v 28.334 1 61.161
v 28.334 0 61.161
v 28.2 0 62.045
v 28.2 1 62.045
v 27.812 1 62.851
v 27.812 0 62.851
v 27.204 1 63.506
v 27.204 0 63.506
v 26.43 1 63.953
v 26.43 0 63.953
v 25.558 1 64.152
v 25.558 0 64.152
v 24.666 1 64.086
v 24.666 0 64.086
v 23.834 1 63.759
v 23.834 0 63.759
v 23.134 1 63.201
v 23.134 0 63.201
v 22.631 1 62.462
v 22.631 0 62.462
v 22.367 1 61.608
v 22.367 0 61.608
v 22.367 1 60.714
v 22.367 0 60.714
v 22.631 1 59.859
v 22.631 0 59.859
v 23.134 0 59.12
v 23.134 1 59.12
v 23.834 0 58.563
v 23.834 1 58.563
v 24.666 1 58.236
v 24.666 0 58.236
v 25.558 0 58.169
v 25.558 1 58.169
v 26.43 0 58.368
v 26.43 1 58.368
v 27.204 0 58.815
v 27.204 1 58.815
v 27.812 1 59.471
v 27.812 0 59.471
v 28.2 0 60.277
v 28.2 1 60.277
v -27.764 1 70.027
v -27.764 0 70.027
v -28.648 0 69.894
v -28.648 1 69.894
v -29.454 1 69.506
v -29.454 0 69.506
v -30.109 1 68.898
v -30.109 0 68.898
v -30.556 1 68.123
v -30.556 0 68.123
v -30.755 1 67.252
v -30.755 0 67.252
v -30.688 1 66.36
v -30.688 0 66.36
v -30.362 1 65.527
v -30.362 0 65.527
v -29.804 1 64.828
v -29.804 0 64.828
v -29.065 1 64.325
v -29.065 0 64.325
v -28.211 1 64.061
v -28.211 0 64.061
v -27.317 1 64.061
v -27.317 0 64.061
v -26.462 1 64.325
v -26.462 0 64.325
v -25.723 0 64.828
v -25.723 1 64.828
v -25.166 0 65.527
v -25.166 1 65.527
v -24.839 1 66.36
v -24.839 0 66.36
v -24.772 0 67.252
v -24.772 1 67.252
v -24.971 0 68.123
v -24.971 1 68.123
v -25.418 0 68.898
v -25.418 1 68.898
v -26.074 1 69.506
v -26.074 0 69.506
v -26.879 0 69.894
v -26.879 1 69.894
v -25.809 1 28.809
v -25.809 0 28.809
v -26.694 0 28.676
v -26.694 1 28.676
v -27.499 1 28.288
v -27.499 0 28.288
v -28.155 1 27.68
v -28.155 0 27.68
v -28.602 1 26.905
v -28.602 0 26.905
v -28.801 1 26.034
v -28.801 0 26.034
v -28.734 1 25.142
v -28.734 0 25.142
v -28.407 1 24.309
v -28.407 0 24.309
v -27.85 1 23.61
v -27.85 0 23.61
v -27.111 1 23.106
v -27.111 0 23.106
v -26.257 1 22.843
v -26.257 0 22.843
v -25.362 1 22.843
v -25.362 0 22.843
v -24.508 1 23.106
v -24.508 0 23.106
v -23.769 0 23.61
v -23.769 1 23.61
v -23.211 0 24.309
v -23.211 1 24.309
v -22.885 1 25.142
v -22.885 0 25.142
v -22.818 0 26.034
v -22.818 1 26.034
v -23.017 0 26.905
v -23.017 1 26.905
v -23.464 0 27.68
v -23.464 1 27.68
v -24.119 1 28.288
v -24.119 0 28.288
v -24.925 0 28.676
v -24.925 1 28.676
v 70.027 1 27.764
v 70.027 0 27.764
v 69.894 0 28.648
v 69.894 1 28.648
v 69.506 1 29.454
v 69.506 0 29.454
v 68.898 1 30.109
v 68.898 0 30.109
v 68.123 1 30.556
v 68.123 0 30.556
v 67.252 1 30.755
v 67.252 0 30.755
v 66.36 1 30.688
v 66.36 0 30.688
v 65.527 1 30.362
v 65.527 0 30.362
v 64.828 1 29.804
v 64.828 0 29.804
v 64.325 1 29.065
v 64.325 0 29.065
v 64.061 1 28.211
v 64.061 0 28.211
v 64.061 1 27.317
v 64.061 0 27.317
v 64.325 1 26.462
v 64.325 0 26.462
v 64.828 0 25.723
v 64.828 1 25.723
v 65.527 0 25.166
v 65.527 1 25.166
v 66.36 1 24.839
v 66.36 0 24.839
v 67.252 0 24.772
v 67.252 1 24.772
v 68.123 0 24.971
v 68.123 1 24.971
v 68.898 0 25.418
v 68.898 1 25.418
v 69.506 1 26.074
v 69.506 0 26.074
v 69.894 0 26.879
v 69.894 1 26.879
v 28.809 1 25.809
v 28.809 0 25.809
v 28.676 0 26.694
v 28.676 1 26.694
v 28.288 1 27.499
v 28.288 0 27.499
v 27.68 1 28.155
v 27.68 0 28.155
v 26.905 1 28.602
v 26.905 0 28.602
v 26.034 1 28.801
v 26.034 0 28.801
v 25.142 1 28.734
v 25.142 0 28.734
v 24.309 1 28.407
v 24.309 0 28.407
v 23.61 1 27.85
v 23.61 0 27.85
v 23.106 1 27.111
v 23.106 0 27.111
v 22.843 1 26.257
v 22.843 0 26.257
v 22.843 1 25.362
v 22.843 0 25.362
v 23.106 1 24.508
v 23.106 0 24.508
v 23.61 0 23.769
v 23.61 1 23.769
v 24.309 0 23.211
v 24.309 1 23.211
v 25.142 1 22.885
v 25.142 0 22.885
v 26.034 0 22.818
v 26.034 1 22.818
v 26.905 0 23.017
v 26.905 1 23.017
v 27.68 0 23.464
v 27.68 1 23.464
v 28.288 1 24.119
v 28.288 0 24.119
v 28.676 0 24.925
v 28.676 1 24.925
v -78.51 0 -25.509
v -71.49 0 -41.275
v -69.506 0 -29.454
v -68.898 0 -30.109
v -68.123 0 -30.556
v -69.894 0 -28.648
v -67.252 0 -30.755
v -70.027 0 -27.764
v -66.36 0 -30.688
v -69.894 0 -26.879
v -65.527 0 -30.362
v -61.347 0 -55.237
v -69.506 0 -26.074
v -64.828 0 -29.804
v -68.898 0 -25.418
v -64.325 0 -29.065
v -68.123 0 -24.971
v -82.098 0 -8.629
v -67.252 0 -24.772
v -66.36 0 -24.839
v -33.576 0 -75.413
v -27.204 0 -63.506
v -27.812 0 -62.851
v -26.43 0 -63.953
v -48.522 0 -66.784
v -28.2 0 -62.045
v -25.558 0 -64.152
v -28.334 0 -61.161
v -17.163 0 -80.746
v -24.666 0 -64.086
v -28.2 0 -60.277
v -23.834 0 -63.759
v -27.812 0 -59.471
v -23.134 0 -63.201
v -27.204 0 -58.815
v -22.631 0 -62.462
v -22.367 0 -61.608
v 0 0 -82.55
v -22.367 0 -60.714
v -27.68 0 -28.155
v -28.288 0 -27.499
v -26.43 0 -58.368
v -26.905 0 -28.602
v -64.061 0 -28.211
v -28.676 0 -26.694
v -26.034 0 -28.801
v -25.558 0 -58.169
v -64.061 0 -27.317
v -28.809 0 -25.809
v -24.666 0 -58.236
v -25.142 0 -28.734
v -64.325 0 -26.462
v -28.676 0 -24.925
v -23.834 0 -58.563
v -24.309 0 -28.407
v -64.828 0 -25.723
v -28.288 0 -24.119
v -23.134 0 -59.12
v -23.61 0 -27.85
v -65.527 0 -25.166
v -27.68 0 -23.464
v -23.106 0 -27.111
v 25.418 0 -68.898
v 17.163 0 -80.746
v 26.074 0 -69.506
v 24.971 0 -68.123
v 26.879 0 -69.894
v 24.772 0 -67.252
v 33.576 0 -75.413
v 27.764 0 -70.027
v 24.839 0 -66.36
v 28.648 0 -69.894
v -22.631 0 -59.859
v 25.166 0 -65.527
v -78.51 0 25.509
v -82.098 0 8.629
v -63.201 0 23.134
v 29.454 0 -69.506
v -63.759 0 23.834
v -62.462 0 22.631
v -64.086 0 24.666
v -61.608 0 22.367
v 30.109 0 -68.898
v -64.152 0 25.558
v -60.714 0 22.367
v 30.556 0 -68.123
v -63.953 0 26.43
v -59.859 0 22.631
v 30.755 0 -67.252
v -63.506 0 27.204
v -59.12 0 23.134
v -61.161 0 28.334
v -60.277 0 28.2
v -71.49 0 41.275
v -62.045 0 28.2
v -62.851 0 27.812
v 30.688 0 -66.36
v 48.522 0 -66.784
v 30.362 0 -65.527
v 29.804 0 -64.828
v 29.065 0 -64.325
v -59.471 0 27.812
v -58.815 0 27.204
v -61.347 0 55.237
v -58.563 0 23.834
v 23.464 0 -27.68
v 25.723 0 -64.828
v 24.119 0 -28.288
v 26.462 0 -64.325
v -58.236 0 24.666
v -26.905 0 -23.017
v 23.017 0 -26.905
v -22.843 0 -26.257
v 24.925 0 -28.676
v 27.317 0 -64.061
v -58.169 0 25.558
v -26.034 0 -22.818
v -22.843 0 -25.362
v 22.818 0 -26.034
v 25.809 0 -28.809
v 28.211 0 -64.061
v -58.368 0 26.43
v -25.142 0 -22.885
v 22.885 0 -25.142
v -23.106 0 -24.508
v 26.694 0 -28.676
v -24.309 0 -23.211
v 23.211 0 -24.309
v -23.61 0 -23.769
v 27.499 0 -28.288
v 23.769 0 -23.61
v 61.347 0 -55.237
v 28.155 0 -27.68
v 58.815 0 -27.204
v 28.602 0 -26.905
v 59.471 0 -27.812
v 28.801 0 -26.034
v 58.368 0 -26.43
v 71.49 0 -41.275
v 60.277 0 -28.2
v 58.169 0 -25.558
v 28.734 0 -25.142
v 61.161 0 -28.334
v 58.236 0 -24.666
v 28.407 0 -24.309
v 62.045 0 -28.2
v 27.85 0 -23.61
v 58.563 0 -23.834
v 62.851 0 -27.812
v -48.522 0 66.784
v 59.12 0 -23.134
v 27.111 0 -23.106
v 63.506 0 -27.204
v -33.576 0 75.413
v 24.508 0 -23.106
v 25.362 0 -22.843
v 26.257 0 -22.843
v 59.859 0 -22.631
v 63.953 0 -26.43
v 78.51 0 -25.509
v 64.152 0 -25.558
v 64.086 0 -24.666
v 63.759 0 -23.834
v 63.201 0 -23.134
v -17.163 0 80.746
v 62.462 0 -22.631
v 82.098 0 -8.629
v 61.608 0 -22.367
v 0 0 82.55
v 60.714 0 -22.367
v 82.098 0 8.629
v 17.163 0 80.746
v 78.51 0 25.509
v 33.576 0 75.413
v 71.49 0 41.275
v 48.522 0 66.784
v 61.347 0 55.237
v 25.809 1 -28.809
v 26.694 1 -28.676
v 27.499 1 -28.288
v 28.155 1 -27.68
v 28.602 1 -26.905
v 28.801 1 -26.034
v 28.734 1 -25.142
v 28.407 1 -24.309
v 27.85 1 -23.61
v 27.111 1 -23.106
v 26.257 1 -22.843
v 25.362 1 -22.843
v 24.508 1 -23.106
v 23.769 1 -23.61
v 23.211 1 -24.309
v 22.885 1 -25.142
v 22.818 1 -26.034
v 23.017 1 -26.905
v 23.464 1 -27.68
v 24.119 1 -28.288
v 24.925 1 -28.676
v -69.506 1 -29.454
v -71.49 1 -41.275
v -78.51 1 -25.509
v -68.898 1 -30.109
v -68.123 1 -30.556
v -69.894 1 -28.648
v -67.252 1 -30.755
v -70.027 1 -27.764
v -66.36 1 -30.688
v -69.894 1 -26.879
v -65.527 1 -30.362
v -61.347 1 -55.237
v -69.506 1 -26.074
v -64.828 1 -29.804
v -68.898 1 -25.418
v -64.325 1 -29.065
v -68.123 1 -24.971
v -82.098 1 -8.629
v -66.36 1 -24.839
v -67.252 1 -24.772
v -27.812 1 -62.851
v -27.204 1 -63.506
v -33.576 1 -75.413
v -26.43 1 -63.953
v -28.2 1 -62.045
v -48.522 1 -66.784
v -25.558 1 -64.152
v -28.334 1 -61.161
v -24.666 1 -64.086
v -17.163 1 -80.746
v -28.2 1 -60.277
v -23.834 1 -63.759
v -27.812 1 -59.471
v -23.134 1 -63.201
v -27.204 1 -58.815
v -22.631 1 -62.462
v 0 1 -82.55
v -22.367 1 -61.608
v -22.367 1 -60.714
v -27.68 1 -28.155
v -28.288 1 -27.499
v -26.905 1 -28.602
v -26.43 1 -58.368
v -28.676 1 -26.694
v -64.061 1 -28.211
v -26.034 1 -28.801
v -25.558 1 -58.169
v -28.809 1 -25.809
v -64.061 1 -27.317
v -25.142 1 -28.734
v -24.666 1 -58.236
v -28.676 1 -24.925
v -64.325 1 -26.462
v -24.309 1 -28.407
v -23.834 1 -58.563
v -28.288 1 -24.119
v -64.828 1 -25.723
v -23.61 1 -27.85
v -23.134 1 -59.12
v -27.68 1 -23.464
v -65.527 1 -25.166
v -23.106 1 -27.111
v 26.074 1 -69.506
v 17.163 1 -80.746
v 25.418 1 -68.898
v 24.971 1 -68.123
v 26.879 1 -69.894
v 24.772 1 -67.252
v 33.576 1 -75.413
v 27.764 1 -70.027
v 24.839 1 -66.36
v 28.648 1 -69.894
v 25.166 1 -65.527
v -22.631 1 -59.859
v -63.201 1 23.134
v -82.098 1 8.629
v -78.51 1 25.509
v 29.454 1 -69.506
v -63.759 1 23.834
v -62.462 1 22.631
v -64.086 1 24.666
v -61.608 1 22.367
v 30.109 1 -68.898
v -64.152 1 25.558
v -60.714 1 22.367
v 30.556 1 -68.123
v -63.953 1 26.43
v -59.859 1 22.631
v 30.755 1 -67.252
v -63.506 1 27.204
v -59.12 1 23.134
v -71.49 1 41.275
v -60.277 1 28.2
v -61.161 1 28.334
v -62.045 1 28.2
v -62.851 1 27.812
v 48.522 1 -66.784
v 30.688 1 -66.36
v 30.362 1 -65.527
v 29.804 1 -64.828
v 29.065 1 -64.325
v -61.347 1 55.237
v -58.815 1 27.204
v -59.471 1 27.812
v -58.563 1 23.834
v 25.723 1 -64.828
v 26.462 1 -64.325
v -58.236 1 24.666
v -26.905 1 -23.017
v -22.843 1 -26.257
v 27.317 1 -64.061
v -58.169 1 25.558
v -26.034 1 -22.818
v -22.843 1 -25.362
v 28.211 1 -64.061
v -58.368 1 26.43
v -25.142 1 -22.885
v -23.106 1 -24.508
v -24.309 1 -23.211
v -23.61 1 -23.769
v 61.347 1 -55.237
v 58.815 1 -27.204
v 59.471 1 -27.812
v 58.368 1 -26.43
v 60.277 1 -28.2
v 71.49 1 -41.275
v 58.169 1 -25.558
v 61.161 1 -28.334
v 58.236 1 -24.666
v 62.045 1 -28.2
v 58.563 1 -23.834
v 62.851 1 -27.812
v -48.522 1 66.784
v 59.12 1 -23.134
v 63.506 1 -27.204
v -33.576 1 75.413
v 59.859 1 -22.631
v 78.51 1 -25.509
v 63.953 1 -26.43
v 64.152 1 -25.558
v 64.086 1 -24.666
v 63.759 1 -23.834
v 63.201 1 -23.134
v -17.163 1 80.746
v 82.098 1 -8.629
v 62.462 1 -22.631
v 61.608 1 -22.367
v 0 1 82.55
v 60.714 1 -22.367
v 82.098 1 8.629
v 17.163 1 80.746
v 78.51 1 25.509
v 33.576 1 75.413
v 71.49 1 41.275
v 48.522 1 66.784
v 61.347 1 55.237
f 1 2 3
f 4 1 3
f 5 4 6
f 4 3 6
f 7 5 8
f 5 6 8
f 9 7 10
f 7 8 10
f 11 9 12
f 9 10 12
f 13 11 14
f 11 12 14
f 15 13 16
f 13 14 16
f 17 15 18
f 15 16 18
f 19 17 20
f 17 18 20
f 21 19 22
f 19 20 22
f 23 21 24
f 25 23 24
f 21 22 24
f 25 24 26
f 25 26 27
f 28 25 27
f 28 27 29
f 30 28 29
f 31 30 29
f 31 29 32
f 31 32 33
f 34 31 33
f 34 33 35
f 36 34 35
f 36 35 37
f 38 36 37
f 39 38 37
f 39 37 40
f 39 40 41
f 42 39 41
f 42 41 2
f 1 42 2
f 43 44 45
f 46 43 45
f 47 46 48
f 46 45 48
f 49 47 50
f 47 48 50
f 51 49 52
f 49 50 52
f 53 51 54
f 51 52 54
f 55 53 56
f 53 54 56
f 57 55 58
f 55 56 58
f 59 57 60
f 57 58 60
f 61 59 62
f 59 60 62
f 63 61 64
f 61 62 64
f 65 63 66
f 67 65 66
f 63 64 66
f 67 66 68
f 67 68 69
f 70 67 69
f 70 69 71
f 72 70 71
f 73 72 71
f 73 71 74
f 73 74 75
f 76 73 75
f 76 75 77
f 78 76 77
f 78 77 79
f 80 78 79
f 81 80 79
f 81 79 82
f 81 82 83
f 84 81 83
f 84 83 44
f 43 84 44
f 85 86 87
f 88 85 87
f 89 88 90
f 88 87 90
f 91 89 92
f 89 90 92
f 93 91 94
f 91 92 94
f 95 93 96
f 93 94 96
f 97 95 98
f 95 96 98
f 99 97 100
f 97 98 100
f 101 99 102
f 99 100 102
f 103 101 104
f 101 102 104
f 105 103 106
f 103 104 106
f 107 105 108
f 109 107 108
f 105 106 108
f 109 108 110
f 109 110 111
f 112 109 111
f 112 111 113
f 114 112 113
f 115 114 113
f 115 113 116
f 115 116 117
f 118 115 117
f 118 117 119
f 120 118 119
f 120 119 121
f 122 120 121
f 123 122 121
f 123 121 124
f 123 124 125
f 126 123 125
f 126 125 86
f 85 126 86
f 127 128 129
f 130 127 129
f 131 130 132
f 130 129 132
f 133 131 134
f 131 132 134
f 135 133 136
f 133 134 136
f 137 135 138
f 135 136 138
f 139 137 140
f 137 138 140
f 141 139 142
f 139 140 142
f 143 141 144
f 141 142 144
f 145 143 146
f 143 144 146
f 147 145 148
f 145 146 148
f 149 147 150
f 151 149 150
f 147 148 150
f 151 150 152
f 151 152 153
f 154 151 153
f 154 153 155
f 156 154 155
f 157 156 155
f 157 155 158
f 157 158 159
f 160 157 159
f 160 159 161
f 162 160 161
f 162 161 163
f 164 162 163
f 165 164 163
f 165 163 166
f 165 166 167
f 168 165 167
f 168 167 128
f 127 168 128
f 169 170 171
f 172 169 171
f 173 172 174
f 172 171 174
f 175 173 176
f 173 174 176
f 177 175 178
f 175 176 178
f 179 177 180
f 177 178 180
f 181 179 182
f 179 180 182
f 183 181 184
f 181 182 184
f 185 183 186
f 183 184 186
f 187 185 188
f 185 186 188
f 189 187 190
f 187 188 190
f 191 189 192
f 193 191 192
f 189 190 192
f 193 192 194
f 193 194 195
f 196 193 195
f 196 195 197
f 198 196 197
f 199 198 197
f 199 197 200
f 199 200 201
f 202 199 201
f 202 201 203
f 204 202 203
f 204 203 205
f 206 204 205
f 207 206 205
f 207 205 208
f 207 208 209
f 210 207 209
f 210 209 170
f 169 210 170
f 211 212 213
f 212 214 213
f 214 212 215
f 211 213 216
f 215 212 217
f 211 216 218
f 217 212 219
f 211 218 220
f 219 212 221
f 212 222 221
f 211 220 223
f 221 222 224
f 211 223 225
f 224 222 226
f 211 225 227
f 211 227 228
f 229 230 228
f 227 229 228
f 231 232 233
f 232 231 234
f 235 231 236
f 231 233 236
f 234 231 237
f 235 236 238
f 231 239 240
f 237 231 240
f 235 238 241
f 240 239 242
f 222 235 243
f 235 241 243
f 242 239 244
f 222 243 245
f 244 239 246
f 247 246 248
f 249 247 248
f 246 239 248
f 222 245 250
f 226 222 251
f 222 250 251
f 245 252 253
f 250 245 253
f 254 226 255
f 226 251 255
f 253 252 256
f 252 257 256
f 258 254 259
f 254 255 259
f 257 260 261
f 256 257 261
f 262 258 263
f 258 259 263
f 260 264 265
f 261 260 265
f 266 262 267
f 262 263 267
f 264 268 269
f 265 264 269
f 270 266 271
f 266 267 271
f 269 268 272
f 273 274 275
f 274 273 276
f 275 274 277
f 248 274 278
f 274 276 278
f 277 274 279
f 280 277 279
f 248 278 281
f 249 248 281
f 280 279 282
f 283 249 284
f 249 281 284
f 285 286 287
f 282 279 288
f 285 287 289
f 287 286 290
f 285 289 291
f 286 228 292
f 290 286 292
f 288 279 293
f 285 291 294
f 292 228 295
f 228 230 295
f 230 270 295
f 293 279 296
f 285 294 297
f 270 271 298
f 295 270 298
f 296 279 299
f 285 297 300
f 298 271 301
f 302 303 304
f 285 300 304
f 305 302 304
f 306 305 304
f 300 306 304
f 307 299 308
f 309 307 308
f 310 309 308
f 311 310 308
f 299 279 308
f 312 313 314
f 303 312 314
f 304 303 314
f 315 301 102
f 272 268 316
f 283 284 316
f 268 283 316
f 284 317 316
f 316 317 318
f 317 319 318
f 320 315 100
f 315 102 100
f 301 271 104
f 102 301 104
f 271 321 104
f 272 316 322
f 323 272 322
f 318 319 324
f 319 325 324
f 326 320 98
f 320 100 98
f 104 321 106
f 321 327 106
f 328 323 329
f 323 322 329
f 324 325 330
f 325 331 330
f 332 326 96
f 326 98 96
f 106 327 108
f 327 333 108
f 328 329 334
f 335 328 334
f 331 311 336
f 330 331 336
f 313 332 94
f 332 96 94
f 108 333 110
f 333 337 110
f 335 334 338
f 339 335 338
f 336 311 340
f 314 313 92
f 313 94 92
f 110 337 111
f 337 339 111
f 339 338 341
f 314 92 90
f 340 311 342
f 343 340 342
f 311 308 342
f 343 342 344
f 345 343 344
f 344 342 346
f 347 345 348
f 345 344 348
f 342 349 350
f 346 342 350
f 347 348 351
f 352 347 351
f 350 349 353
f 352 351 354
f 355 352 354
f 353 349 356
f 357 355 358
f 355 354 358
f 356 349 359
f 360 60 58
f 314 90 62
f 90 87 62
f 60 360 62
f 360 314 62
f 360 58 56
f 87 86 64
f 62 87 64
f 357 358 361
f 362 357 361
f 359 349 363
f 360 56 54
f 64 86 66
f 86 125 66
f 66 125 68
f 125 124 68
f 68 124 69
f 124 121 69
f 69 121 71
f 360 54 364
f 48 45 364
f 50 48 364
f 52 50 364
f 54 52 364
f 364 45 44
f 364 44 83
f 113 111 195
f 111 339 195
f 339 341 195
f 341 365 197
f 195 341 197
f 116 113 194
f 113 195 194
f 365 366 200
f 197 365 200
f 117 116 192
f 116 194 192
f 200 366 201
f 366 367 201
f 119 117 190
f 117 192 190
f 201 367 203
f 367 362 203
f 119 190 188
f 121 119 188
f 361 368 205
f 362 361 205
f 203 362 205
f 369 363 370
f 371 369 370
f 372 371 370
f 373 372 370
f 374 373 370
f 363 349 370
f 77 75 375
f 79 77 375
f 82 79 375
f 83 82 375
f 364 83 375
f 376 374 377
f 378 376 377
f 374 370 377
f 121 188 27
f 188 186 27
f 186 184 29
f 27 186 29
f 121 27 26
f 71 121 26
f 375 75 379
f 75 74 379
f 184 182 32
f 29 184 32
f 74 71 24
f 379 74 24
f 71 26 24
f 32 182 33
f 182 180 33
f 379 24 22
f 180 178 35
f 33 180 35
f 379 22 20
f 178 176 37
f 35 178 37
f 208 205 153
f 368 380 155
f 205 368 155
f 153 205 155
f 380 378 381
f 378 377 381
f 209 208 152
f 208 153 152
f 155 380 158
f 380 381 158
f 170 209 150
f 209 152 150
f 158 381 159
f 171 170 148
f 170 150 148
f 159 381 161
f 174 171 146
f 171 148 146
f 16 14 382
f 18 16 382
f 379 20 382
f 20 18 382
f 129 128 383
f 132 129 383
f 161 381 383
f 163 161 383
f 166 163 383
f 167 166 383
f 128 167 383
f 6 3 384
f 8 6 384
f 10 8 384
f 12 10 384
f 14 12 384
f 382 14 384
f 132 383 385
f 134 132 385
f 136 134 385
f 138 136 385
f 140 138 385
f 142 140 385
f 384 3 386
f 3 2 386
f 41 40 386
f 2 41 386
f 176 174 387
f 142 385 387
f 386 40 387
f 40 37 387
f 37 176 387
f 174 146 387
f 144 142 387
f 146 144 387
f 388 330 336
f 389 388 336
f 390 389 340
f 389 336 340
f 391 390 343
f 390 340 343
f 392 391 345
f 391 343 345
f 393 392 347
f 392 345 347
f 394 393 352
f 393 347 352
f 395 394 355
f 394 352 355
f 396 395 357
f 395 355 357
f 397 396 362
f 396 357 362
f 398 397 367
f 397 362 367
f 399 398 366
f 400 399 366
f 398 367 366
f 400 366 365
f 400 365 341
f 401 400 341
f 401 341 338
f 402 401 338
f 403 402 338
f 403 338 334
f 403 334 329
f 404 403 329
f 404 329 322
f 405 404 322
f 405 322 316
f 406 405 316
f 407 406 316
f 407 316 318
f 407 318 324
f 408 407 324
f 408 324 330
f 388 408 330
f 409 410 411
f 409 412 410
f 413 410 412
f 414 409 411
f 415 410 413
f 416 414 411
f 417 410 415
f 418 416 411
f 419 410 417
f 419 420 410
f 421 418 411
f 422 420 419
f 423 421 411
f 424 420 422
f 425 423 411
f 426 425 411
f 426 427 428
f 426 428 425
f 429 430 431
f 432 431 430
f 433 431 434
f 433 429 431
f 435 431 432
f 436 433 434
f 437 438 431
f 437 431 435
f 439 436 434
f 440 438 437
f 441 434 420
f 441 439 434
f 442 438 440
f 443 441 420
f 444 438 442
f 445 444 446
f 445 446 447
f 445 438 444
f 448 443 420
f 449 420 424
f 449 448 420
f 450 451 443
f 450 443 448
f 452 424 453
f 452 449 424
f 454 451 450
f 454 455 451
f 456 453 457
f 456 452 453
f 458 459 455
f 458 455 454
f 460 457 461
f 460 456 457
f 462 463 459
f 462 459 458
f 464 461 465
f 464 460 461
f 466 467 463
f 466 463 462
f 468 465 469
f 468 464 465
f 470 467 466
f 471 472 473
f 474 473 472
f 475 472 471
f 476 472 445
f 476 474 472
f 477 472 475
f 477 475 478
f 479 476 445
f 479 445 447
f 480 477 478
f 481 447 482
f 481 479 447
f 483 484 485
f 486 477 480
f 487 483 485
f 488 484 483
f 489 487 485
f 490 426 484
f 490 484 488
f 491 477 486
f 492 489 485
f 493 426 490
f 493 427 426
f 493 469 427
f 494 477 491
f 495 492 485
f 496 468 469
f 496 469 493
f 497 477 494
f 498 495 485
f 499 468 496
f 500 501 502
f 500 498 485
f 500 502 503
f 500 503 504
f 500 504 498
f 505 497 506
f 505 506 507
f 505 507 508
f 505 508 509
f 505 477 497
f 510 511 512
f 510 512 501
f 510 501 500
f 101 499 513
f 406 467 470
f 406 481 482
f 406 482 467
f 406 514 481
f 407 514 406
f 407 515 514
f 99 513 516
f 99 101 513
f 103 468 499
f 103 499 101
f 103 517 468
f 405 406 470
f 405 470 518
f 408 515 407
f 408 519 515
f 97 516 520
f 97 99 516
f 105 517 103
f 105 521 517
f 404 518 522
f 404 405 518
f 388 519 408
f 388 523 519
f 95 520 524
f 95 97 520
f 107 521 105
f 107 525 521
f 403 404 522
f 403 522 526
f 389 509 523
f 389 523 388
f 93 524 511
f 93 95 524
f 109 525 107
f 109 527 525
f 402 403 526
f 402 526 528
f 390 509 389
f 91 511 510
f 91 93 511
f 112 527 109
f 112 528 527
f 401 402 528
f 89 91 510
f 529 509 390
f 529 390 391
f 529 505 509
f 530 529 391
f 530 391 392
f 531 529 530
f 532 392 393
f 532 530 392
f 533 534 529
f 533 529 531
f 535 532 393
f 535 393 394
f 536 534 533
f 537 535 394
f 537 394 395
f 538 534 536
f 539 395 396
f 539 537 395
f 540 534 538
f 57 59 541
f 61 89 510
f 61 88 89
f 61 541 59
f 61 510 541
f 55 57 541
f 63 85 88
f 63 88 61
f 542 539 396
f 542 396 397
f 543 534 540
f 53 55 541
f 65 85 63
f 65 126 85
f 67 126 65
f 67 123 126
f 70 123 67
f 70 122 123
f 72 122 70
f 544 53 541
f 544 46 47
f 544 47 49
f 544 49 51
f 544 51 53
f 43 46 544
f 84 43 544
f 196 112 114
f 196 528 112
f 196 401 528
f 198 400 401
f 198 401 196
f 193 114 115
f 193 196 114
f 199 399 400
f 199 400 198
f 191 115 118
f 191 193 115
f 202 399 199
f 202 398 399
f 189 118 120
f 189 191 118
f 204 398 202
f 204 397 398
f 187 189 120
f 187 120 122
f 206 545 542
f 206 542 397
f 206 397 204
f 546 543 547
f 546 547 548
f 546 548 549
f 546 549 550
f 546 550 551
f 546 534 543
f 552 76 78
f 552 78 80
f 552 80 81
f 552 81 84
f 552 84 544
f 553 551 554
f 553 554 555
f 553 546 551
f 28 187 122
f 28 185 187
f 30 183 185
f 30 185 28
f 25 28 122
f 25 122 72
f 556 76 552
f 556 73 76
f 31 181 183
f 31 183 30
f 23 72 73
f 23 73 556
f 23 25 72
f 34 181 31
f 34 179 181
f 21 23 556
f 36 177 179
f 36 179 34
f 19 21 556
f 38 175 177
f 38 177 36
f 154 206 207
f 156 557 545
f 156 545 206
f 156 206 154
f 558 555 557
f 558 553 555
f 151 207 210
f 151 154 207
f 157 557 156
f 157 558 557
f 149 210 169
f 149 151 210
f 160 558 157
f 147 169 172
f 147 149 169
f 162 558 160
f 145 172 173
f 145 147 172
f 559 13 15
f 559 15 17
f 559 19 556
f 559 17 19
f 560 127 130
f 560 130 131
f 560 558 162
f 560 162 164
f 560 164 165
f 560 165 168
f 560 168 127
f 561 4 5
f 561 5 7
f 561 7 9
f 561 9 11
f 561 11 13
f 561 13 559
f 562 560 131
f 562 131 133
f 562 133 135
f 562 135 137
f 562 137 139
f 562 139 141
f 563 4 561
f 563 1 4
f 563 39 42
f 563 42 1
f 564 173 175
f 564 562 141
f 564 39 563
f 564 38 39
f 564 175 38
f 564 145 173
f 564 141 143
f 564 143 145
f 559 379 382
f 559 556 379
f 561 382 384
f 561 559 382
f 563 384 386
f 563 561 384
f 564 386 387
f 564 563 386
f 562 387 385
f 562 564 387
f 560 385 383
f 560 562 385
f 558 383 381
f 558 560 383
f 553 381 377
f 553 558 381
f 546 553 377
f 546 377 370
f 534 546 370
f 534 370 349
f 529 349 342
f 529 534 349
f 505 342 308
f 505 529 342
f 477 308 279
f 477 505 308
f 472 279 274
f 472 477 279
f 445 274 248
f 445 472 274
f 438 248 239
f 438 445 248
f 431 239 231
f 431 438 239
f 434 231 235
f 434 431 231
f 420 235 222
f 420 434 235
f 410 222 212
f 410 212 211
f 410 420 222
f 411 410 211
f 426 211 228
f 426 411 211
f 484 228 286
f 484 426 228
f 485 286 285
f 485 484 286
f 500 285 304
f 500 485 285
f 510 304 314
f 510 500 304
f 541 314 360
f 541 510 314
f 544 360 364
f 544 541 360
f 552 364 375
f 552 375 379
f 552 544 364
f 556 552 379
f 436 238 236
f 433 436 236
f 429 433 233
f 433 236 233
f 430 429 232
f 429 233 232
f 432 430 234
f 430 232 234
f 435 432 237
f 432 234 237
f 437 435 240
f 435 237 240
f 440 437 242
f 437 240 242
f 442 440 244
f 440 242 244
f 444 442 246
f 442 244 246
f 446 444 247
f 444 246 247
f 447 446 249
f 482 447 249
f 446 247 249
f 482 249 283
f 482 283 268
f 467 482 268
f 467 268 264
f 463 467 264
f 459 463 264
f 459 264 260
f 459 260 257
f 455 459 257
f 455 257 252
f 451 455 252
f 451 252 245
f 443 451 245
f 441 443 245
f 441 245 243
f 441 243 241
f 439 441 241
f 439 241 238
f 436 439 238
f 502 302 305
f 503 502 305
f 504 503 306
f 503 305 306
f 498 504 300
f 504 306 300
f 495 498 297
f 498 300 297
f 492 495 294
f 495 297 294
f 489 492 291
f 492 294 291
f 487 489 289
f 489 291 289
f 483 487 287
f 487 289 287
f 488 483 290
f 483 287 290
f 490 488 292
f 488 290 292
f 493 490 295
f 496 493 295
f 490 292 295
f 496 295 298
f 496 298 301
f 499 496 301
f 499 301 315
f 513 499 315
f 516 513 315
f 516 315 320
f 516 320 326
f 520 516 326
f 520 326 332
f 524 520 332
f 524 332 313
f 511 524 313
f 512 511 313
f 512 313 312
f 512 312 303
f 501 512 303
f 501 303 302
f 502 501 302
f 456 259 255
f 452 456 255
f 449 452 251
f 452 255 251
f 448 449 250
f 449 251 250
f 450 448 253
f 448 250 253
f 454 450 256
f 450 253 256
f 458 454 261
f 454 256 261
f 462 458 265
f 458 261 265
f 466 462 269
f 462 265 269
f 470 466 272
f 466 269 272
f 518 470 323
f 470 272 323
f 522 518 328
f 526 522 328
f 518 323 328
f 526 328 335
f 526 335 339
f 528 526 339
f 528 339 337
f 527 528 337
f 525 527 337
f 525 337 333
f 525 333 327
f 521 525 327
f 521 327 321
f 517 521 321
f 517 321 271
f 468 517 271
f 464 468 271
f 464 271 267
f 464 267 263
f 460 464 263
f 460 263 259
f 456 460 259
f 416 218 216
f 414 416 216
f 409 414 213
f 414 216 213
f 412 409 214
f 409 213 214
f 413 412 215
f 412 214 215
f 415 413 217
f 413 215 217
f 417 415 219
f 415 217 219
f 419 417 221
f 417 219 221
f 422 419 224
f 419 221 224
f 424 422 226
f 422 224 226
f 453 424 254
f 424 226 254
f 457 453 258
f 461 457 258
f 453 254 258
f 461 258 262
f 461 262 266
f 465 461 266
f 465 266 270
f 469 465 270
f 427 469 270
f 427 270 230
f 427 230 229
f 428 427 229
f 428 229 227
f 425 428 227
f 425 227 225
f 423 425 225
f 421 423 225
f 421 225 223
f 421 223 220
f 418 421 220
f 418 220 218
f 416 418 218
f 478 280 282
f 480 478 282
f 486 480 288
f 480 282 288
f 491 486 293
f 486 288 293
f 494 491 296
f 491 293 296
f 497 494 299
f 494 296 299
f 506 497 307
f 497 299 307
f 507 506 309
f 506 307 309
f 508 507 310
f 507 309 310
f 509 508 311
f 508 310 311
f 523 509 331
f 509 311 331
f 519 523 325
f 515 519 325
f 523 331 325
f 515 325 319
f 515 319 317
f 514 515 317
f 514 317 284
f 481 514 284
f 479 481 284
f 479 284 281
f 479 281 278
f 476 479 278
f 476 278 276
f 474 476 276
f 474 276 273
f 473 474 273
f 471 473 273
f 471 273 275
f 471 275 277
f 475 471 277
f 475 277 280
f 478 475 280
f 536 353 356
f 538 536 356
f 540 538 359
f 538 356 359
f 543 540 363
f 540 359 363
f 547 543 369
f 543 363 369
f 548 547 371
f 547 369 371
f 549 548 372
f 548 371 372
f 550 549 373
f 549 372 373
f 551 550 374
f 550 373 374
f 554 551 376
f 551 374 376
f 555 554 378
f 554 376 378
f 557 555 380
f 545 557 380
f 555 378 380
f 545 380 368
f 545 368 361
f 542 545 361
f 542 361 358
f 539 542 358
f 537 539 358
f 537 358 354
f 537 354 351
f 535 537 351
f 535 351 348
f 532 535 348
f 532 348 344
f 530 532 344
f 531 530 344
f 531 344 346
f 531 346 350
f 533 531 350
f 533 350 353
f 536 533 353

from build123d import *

# Parameters (mm, degrees)
SKETCH2_W                    = 82.55
SKETCH2_H                    = 1
F_10_0_1935_DIAMETER_HOLE1_D = 5.999999938
CIRPATTERN3_COUNT            = 4


with BuildPart() as part:
    # Sketch2 → Revolve1 (revolve)
    with BuildSketch(Plane(origin=(0, 0, 0), x_dir=(0, 0, -1), z_dir=(1, 0, 0))):
        with Locations((-41.275, 0.5)):
            Rectangle(SKETCH2_W, SKETCH2_H)
    revolve(axis=Axis((0, -0.05, 0), (0, 1, 0)))

    # #10 (0.1935) Diameter Hole1 (through all)
    with Locations(Plane(origin=(0, 1, 0), x_dir=(1, 0, 0), z_dir=(0, 1, 0))):
        with Locations((-25.333643223, 61.160825052), (264.743675233, 73.787758551), (-67.027460084, 27.763683018), (-25.809397513, 25.809397513)):
            f_10_0_1935_diameter_hole1 = Hole(F_10_0_1935_DIAMETER_HOLE1_D / 2)

    # CirPattern3: #10 (0.1935) Diameter Hole1 ×4 about axis
    cirpattern3_axis = Axis((0, 0, 0), (0, 1, 0))
    for i in range(1, CIRPATTERN3_COUNT):
        add(f_10_0_1935_diameter_hole1.rotate(cirpattern3_axis, i * 360 / CIRPATTERN3_COUNT), mode=Mode.SUBTRACT)


solid = part.part
